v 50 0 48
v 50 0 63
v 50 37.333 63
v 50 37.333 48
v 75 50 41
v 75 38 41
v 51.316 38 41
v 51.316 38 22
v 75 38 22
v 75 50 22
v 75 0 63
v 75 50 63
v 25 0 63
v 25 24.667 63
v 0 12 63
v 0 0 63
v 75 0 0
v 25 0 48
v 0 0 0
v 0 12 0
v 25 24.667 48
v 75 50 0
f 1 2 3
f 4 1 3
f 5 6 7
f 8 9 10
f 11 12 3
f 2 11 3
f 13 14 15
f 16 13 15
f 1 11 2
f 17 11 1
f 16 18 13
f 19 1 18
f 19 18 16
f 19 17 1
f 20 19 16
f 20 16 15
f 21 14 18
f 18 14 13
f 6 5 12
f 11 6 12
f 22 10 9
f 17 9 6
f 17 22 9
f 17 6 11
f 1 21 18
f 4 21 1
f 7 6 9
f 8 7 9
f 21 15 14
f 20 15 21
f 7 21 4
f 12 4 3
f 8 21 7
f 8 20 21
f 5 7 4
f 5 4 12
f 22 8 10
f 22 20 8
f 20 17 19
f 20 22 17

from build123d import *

# Parameters (mm, degrees)
BOSS_EXTRUDE1_DEPTH = 63
CUT_EXTRUDE1_DEPTH  = 15
SKETCH6_W           = 19
SKETCH6_H           = 12
CUT_EXTRUDE3_DEPTH  = 25


with BuildPart() as part:
    # Sketch1 → Boss-Extrude1 (new body)
    with BuildSketch(Plane.XY):
        Polygon((75, 0), (0, 0), (0, 12), (75, 50), align=None)
    extrude(amount=BOSS_EXTRUDE1_DEPTH)

    # Sketch2 → Cut-Extrude1 (cut)
    with BuildSketch(Plane.XY.offset(63)):
        Polygon((25, 24.666666667), (25, 0), (50, 0), (50, 37.333333333), align=None)
    extrude(amount=-CUT_EXTRUDE1_DEPTH, mode=Mode.SUBTRACT)

    # Sketch6 → Cut-Extrude3 (cut)
    with BuildSketch(Plane(origin=(75, 0, 0), x_dir=(0, 0, -1), z_dir=(1, 0, 0))):
        with Locations((-31.5, 44)):
            Rectangle(SKETCH6_W, SKETCH6_H)
    extrude(amount=-CUT_EXTRUDE3_DEPTH, mode=Mode.SUBTRACT)


solid = part.part
